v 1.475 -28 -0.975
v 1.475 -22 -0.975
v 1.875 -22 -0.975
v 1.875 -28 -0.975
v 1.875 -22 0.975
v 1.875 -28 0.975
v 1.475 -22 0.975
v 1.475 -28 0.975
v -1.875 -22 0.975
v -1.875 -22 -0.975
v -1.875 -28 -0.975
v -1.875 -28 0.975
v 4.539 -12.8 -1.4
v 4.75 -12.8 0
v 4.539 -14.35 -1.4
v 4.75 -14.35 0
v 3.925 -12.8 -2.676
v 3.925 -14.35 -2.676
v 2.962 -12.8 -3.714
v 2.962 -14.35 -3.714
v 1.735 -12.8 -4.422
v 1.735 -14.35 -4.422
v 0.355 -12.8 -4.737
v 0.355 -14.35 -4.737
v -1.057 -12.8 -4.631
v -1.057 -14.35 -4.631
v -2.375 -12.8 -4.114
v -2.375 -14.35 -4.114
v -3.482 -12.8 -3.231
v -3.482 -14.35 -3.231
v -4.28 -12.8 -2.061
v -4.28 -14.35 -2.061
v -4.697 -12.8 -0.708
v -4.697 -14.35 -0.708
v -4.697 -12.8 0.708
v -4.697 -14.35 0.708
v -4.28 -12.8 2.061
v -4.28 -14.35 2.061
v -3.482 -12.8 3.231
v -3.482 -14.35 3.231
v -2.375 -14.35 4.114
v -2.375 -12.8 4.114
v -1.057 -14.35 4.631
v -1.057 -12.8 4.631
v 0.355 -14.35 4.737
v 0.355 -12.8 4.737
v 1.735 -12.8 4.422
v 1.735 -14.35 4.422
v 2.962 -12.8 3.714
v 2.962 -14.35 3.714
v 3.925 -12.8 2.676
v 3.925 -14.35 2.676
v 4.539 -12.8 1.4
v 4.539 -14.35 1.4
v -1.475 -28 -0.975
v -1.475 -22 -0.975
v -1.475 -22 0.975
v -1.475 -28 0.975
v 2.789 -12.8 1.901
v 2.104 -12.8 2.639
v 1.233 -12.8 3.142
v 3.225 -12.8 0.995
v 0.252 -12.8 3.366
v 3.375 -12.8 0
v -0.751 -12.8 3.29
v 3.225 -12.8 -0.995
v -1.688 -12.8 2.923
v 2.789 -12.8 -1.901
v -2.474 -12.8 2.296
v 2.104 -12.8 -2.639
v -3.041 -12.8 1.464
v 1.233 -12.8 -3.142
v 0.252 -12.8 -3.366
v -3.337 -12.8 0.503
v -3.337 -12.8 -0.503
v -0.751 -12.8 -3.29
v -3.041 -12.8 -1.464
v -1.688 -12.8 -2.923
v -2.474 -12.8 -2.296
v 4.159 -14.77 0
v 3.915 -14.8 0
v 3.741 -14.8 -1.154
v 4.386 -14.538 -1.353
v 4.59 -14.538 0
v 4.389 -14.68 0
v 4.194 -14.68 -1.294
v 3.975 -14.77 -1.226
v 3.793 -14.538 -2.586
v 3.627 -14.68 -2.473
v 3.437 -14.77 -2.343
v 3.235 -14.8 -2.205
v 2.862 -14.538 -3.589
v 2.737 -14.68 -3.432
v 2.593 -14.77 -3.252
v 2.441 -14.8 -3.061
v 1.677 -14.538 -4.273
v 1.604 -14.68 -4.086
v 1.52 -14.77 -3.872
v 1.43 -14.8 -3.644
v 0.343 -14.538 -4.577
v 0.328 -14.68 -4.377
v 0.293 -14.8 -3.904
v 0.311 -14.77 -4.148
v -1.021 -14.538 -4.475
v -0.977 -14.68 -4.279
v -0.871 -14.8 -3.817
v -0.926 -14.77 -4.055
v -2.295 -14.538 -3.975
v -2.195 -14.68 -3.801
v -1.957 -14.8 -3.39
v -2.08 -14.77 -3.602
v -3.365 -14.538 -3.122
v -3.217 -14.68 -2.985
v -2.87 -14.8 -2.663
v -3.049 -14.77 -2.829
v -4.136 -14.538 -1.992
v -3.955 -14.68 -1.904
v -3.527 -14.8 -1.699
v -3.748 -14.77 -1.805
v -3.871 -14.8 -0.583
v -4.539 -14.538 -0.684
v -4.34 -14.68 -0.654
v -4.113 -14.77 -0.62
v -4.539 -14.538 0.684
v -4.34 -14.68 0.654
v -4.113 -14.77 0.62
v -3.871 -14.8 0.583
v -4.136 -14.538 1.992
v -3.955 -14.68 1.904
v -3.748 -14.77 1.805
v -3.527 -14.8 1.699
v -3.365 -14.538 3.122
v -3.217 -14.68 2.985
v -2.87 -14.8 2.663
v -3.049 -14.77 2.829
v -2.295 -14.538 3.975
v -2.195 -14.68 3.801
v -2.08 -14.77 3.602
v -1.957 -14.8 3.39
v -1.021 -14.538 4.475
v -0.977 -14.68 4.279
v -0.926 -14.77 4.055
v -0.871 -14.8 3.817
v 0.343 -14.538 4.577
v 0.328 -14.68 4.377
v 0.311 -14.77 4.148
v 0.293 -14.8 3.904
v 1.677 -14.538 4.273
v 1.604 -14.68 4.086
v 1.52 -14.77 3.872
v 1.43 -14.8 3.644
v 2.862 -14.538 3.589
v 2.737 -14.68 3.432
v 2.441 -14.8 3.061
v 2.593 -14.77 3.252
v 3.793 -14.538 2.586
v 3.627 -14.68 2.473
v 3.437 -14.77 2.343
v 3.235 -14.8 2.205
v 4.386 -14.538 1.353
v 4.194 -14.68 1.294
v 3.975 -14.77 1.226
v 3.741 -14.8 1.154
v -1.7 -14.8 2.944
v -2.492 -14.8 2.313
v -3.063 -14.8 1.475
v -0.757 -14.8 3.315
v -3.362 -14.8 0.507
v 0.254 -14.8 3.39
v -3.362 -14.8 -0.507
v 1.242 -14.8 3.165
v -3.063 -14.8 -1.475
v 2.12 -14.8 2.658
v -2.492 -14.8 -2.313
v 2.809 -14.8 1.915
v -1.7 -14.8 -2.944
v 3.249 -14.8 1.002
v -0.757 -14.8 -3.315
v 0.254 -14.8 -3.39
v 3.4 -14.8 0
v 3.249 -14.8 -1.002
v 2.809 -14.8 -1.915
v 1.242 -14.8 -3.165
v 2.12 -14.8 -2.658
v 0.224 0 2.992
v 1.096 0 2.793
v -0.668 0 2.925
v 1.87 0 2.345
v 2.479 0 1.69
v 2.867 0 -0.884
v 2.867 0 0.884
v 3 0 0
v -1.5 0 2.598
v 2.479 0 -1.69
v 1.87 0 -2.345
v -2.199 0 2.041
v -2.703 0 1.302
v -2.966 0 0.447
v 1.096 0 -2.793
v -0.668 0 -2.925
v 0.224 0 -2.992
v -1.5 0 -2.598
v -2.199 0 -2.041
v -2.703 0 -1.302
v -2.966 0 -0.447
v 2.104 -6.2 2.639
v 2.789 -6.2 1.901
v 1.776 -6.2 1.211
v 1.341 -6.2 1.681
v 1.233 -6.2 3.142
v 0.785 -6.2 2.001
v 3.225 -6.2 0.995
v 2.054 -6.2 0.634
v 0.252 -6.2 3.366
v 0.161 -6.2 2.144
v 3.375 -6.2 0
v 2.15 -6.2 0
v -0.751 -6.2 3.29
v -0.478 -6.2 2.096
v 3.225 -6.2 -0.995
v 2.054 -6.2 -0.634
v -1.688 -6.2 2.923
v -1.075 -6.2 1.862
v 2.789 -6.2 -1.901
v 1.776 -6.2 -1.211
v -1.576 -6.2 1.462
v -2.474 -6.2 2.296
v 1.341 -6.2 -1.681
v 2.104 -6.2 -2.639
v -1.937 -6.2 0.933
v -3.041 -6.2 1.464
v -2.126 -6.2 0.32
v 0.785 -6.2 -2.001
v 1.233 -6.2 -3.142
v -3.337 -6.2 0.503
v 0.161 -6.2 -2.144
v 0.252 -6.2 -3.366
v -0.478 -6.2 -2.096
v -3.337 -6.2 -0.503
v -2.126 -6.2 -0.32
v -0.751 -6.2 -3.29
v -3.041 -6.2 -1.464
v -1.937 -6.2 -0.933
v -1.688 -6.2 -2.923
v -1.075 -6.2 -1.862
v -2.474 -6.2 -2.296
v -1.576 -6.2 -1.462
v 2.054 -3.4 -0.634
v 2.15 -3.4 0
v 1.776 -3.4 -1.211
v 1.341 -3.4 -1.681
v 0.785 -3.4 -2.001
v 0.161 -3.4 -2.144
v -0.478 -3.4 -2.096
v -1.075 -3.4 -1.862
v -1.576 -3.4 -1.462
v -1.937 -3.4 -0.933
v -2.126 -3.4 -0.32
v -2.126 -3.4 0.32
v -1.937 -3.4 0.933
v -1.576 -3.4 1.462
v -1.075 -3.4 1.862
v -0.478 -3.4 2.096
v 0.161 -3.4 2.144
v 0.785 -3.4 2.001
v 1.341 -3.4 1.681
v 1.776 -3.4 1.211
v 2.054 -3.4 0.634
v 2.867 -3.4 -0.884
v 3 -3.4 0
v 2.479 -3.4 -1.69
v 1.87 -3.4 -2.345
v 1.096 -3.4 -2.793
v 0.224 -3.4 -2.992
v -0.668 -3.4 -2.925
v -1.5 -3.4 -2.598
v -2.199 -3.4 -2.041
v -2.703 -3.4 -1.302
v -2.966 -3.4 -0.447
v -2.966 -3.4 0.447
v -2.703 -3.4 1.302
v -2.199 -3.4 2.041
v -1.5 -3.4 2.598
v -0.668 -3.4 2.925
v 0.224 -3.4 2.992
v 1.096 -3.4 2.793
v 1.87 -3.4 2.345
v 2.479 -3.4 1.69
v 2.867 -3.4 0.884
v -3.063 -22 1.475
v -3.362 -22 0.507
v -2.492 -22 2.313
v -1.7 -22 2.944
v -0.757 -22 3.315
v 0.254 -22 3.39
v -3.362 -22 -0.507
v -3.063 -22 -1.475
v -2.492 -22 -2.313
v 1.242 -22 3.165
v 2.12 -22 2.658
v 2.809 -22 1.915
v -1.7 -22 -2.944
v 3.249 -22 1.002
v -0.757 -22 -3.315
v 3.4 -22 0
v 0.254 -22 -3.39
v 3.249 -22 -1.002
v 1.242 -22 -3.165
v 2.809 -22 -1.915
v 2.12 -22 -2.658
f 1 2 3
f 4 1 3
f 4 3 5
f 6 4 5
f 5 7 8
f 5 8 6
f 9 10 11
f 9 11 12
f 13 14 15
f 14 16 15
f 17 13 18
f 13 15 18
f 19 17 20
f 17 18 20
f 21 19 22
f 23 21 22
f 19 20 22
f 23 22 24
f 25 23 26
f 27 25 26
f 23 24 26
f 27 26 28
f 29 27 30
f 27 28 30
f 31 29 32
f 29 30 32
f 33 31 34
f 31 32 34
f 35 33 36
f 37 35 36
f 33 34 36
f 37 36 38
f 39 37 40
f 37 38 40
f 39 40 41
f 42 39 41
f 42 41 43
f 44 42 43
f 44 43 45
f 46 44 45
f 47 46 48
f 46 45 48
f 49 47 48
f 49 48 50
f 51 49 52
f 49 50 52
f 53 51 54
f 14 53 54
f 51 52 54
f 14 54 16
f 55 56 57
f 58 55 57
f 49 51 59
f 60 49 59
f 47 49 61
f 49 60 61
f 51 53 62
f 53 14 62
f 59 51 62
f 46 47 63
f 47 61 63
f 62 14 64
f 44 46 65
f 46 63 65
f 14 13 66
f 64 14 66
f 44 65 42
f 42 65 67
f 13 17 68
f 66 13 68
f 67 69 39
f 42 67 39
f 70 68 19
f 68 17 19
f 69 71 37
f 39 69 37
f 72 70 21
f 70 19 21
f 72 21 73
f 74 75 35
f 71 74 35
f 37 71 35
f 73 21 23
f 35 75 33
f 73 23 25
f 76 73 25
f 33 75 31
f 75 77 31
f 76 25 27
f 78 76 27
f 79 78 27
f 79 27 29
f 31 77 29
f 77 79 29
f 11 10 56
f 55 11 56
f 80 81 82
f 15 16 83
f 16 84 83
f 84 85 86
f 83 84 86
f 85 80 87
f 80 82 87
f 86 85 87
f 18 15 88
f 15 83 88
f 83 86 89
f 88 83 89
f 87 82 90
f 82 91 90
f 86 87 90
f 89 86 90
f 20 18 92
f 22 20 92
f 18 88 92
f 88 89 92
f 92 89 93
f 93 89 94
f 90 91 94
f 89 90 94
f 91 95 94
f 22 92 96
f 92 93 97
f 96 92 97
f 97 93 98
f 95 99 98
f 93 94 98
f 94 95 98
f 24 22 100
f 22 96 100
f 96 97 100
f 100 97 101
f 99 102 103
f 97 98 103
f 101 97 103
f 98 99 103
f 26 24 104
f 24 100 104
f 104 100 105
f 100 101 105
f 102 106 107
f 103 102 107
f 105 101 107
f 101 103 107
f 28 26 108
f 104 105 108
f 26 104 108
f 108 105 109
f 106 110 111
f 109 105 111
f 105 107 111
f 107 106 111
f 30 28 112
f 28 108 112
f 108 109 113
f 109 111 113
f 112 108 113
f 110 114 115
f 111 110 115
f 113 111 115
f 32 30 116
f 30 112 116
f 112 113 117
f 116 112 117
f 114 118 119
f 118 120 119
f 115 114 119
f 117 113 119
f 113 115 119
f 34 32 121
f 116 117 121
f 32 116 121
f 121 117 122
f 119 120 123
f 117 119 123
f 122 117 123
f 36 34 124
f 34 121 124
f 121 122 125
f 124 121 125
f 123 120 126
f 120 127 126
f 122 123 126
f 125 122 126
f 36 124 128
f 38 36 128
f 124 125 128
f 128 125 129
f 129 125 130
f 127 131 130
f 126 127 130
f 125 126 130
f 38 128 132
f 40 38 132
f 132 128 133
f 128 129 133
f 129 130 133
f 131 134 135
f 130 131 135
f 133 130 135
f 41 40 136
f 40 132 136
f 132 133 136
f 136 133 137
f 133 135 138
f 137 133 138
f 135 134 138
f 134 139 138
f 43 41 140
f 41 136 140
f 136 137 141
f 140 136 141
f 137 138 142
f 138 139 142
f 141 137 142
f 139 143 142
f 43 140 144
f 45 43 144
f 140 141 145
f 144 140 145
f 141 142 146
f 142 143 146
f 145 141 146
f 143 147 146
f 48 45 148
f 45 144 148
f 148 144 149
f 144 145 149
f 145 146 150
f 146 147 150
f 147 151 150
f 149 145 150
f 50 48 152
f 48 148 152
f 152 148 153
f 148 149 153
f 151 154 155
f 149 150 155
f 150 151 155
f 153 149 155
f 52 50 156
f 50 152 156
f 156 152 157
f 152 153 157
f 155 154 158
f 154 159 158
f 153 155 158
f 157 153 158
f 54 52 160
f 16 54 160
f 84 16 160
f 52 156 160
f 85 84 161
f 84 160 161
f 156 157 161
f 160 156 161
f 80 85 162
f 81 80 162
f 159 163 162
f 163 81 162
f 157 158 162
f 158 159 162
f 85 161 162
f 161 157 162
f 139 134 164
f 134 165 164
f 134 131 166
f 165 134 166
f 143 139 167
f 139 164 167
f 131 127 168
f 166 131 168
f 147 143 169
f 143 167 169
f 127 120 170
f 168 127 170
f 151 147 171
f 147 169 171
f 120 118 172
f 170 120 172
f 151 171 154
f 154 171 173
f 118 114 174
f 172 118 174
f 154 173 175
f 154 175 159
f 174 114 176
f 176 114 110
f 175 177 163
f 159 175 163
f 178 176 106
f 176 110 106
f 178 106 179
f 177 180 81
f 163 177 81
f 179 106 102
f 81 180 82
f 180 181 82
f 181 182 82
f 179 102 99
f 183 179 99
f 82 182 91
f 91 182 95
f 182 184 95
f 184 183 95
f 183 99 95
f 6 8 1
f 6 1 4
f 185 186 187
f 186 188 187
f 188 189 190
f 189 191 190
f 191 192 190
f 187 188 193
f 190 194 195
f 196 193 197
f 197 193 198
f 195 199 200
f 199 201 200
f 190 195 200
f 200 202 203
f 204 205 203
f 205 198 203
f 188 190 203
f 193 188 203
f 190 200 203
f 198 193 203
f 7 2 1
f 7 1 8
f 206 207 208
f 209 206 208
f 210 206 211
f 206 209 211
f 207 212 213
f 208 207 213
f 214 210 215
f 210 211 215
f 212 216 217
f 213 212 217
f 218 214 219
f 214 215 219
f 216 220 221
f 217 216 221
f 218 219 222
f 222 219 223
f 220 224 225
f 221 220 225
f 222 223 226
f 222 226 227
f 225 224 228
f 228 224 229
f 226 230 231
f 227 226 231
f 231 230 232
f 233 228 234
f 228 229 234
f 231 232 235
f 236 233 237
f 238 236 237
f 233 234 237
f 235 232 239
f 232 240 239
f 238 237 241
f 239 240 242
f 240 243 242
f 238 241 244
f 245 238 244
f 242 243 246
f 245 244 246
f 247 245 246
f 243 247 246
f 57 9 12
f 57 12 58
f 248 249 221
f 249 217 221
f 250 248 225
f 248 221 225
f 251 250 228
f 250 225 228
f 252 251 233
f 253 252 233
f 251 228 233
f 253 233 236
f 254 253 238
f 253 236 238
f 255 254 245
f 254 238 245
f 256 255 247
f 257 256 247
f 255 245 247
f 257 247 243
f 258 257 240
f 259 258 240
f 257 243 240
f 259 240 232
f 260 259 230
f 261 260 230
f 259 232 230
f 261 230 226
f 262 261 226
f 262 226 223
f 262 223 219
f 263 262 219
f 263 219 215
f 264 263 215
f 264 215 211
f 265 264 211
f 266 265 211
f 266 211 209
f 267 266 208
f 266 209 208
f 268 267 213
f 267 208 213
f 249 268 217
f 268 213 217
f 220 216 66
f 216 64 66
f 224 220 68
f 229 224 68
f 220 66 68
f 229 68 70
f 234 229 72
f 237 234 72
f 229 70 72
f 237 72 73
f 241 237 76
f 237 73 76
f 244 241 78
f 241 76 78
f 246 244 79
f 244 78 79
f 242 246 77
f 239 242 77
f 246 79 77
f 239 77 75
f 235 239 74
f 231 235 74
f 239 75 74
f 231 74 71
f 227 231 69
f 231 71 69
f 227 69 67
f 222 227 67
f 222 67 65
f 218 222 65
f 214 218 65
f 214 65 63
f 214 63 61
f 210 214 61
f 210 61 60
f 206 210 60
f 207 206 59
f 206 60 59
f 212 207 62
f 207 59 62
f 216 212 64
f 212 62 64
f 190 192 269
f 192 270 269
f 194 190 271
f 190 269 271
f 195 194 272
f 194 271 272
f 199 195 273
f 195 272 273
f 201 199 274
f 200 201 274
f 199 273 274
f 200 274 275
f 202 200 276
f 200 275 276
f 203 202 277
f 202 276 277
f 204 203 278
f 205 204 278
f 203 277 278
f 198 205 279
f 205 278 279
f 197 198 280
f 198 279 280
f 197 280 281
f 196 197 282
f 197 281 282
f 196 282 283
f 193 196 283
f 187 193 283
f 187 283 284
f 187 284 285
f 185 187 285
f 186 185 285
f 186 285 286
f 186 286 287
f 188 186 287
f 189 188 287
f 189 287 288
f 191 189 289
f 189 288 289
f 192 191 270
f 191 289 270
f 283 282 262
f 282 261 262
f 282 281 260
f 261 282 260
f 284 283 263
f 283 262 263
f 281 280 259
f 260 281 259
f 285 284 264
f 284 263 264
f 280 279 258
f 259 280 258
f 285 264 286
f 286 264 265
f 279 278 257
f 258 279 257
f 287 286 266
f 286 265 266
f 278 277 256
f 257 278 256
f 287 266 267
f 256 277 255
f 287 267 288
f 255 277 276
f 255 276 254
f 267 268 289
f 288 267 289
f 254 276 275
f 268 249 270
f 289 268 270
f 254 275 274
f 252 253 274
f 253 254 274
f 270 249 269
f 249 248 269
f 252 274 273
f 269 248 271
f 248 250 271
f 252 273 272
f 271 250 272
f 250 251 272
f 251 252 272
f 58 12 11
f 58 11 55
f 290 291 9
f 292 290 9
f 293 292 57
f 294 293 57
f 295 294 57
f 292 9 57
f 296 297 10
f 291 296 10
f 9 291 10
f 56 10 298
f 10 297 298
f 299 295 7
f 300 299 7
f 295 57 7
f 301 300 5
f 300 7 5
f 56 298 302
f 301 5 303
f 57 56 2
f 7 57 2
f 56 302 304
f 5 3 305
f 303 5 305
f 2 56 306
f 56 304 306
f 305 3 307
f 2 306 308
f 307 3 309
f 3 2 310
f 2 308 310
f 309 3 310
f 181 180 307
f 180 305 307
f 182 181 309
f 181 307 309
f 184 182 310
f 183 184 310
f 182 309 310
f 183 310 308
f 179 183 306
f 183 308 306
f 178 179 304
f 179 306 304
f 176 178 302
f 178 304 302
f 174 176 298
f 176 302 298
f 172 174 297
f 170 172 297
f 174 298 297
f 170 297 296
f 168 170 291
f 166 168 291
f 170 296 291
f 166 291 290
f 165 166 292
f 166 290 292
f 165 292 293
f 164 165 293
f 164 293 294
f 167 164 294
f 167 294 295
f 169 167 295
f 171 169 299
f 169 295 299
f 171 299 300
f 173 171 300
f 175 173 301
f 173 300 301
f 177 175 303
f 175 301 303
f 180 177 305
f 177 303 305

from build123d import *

# Parameters (mm, degrees)
SKETCH2_W           = 0.4
SKETCH2_H           = 1.95
BOSS_EXTRUDE1_DEPTH = 6


with BuildPart() as part:
    # Sketch1 → Revolve1 (revolve)
    with BuildSketch(Plane.XY):
        with BuildLine():
            Line((0, 0), (3, 0))
            Line((3, 0), (3, -3.4))
            Line((3, -3.4), (2.15, -3.4))
            Line((2.15, -3.4), (2.15, -6.2))
            Line((2.15, -6.2), (3.375, -6.2))
            Line((3.375, -6.2), (3.375, -12.8))
            Line((3.375, -12.8), (4.75, -12.8))
            Line((4.75, -12.8), (4.75, -14.35))
            ThreePointArc((4.75, -14.35), (4.389176995, -14.680340843), (3.914835346, -14.8))
            Line((3.914835346, -14.8), (3.4, -14.8))
            Line((3.4, -14.8), (3.4, -22))
            Line((3.4, -22), (0, -22))
            Line((0, -22), (0, 0))
        make_face()
    revolve(axis=Axis((0, -223.623157896, 0), (0, 1, 0)))

    # Sketch2 → Boss-Extrude1 (add)
    with BuildSketch(Plane.XZ.offset(22)):
        with Locations((-1.675, 0)):
            Rectangle(SKETCH2_W, SKETCH2_H)
        with Locations((1.675, 0)):
            Rectangle(SKETCH2_W, SKETCH2_H)
    extrude(amount=BOSS_EXTRUDE1_DEPTH)


solid = part.part
